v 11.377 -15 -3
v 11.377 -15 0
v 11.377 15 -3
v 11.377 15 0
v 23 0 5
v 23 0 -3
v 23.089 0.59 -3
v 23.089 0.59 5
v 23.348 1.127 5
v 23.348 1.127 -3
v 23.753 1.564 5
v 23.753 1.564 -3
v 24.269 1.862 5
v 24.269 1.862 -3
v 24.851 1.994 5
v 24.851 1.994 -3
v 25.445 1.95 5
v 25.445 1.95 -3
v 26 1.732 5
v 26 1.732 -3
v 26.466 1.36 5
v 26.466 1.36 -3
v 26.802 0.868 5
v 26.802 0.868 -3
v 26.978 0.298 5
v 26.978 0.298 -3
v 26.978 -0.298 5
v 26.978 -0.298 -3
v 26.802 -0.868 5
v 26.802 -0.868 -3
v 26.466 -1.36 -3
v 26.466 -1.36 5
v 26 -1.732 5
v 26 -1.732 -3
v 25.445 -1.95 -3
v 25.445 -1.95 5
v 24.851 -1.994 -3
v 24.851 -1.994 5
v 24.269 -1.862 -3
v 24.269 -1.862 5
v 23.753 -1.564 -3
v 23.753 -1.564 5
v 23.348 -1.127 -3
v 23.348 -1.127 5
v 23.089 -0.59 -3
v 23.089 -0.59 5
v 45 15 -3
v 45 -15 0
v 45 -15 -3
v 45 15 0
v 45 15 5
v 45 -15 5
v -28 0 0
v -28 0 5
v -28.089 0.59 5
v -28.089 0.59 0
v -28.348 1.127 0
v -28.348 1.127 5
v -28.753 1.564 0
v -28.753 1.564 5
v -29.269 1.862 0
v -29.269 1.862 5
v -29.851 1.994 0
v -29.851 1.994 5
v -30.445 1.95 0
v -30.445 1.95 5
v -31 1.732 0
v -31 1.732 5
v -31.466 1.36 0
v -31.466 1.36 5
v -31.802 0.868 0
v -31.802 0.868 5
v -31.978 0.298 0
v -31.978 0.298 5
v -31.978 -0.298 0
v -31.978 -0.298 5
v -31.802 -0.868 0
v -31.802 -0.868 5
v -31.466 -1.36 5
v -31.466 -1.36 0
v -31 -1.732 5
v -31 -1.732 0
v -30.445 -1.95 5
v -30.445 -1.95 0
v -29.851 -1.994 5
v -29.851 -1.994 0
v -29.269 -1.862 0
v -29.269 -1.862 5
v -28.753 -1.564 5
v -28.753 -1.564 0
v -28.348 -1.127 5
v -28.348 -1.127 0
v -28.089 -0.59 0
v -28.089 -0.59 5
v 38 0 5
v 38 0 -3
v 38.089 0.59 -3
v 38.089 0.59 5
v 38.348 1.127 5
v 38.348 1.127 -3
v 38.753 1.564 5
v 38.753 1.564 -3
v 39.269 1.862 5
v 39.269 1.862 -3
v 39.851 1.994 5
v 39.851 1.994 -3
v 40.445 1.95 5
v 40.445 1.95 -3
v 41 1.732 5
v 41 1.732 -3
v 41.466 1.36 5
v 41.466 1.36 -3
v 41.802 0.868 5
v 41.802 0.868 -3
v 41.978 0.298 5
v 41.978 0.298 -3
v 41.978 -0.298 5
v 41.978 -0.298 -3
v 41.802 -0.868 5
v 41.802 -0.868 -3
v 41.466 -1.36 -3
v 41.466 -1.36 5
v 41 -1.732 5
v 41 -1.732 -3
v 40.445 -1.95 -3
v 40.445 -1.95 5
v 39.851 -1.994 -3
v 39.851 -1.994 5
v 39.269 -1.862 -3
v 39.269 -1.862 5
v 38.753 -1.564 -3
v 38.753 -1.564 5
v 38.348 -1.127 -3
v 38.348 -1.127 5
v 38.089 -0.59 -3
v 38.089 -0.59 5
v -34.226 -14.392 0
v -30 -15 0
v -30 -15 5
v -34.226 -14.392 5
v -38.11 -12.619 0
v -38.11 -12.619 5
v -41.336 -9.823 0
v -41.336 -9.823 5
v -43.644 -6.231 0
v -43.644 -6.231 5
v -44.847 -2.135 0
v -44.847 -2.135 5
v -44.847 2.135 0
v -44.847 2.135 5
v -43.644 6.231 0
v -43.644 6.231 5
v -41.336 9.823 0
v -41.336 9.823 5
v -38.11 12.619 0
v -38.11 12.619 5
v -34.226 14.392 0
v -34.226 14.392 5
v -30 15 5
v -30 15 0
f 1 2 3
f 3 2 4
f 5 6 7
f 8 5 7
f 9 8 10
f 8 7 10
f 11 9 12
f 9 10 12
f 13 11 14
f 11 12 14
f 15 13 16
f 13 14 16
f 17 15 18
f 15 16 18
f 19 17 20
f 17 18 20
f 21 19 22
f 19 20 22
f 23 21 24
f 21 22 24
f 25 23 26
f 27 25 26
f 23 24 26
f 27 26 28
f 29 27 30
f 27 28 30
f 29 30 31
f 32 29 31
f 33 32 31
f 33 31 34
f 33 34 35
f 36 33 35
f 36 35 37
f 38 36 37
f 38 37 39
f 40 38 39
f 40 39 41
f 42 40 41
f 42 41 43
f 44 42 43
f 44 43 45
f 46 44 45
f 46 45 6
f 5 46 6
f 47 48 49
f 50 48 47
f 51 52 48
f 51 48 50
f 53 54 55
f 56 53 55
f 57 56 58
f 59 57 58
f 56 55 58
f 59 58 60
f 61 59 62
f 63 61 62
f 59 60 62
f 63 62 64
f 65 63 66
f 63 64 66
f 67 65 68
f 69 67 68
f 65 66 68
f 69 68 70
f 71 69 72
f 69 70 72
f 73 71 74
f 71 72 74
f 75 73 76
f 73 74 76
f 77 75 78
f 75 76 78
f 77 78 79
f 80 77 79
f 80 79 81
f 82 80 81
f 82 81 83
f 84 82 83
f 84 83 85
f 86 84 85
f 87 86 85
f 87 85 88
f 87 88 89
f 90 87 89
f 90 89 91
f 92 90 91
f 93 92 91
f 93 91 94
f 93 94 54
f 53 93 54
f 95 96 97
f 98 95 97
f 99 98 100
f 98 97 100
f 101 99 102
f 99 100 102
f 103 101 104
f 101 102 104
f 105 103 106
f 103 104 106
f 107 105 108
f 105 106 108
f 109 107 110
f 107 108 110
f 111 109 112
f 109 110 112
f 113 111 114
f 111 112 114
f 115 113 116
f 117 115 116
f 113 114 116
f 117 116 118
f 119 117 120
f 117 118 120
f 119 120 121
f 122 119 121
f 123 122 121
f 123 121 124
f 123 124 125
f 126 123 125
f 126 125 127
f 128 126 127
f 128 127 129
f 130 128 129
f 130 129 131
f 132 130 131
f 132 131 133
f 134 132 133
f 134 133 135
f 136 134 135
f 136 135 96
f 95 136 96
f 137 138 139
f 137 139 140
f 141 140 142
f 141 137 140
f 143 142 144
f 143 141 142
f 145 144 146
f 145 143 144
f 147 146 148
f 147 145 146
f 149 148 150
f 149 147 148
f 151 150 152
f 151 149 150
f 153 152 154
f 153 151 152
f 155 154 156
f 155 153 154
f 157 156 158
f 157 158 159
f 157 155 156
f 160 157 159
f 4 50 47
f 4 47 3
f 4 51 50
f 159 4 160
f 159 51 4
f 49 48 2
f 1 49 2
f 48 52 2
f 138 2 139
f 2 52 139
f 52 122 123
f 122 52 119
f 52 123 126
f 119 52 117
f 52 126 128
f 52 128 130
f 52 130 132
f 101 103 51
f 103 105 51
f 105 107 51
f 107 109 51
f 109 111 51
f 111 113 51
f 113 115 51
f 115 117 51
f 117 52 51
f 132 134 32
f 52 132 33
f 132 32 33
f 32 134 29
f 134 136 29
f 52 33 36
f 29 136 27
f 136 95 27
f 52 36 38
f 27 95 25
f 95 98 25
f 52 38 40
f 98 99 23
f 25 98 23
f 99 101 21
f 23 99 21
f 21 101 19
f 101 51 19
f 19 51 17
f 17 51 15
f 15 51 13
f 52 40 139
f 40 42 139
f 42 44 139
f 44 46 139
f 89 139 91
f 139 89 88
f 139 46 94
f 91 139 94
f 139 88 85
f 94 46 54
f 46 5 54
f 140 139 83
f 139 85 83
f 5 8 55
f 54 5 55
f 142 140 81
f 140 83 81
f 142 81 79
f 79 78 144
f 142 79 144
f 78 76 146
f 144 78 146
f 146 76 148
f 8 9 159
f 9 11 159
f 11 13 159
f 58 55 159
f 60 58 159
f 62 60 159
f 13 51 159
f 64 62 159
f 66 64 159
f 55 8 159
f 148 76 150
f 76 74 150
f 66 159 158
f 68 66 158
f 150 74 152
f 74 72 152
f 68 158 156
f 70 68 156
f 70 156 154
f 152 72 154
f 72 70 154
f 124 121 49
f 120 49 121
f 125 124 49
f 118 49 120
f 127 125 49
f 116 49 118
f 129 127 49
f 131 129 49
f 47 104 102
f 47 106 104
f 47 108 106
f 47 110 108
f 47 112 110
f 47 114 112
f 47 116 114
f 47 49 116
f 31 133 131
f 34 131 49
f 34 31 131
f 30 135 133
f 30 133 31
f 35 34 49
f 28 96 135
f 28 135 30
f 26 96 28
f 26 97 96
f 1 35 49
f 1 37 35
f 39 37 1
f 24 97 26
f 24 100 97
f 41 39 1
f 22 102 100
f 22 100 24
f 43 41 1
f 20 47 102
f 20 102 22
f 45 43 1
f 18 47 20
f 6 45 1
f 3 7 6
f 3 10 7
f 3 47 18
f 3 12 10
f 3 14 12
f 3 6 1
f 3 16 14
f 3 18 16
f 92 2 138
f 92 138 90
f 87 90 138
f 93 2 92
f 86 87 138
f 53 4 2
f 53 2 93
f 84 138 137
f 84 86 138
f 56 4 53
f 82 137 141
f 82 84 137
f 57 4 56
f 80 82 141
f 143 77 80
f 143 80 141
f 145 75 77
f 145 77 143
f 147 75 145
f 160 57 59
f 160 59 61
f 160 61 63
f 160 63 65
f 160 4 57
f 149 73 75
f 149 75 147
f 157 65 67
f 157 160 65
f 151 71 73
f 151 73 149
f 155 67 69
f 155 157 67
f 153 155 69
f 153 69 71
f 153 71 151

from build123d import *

# Parameters (mm, degrees)
BOSS_EXTRUDE2_DEPTH = 5
SKETCH3_R           = 2
CUT_EXTRUDE1_DEPTH  = 48.696960071
SKETCH5_W           = 33.623135457
SKETCH5_H           = 30
BOSS_EXTRUDE3_DEPTH = 3
SKETCH6_R           = 2
CUT_EXTRUDE2_DEPTH  = 3
SKETCH7_R           = 2
CUT_EXTRUDE3_DEPTH  = 49.104053883


with BuildPart() as part:
    # Sketch1 → Boss-Extrude2 (new body)
    with BuildSketch(Plane.XY):
        with BuildLine():
            Line((-30, 15), (45, 15))
            Line((45, 15), (45, -15))
            Line((45, -15), (-30, -15))
            ThreePointArc((-30, -15), (-45, 0), (-30, 15))
        make_face()
    extrude(amount=BOSS_EXTRUDE2_DEPTH)

    # Sketch3 → Cut-Extrude1 (cut, through all)
    with BuildSketch(Plane(origin=(0, 0, 0), x_dir=(-1, 0, 0), z_dir=(0, 0, -1))):
        with Locations((-40, 0)):
            Circle(SKETCH3_R)
        with Locations((-25, 0)):
            Circle(SKETCH3_R)
    extrude(amount=-CUT_EXTRUDE1_DEPTH, mode=Mode.SUBTRACT)

    # Sketch5 → Boss-Extrude3 (add)
    with BuildSketch(Plane(origin=(0, 0, 0), x_dir=(-1, 0, 0), z_dir=(0, 0, -1))):
        with Locations((-28.188432271, 0)):
            Rectangle(SKETCH5_W, SKETCH5_H)
    extrude(amount=BOSS_EXTRUDE3_DEPTH)

    # Sketch6 → Cut-Extrude2 (cut)
    with BuildSketch(Plane(origin=(0, 0, -3), x_dir=(-1, 0, 0), z_dir=(0, 0, -1))):
        with Locations((-40, 0)):
            Circle(SKETCH6_R)
        with Locations((-25, 0)):
            Circle(SKETCH6_R)
    extrude(amount=-CUT_EXTRUDE2_DEPTH, mode=Mode.SUBTRACT)

    # Sketch7 → Cut-Extrude3 (cut, through all)
    with BuildSketch(Plane.XY.offset(5)):
        with Locations((-30, 0)):
            Circle(SKETCH7_R)
    extrude(amount=-CUT_EXTRUDE3_DEPTH, mode=Mode.SUBTRACT)


solid = part.part
